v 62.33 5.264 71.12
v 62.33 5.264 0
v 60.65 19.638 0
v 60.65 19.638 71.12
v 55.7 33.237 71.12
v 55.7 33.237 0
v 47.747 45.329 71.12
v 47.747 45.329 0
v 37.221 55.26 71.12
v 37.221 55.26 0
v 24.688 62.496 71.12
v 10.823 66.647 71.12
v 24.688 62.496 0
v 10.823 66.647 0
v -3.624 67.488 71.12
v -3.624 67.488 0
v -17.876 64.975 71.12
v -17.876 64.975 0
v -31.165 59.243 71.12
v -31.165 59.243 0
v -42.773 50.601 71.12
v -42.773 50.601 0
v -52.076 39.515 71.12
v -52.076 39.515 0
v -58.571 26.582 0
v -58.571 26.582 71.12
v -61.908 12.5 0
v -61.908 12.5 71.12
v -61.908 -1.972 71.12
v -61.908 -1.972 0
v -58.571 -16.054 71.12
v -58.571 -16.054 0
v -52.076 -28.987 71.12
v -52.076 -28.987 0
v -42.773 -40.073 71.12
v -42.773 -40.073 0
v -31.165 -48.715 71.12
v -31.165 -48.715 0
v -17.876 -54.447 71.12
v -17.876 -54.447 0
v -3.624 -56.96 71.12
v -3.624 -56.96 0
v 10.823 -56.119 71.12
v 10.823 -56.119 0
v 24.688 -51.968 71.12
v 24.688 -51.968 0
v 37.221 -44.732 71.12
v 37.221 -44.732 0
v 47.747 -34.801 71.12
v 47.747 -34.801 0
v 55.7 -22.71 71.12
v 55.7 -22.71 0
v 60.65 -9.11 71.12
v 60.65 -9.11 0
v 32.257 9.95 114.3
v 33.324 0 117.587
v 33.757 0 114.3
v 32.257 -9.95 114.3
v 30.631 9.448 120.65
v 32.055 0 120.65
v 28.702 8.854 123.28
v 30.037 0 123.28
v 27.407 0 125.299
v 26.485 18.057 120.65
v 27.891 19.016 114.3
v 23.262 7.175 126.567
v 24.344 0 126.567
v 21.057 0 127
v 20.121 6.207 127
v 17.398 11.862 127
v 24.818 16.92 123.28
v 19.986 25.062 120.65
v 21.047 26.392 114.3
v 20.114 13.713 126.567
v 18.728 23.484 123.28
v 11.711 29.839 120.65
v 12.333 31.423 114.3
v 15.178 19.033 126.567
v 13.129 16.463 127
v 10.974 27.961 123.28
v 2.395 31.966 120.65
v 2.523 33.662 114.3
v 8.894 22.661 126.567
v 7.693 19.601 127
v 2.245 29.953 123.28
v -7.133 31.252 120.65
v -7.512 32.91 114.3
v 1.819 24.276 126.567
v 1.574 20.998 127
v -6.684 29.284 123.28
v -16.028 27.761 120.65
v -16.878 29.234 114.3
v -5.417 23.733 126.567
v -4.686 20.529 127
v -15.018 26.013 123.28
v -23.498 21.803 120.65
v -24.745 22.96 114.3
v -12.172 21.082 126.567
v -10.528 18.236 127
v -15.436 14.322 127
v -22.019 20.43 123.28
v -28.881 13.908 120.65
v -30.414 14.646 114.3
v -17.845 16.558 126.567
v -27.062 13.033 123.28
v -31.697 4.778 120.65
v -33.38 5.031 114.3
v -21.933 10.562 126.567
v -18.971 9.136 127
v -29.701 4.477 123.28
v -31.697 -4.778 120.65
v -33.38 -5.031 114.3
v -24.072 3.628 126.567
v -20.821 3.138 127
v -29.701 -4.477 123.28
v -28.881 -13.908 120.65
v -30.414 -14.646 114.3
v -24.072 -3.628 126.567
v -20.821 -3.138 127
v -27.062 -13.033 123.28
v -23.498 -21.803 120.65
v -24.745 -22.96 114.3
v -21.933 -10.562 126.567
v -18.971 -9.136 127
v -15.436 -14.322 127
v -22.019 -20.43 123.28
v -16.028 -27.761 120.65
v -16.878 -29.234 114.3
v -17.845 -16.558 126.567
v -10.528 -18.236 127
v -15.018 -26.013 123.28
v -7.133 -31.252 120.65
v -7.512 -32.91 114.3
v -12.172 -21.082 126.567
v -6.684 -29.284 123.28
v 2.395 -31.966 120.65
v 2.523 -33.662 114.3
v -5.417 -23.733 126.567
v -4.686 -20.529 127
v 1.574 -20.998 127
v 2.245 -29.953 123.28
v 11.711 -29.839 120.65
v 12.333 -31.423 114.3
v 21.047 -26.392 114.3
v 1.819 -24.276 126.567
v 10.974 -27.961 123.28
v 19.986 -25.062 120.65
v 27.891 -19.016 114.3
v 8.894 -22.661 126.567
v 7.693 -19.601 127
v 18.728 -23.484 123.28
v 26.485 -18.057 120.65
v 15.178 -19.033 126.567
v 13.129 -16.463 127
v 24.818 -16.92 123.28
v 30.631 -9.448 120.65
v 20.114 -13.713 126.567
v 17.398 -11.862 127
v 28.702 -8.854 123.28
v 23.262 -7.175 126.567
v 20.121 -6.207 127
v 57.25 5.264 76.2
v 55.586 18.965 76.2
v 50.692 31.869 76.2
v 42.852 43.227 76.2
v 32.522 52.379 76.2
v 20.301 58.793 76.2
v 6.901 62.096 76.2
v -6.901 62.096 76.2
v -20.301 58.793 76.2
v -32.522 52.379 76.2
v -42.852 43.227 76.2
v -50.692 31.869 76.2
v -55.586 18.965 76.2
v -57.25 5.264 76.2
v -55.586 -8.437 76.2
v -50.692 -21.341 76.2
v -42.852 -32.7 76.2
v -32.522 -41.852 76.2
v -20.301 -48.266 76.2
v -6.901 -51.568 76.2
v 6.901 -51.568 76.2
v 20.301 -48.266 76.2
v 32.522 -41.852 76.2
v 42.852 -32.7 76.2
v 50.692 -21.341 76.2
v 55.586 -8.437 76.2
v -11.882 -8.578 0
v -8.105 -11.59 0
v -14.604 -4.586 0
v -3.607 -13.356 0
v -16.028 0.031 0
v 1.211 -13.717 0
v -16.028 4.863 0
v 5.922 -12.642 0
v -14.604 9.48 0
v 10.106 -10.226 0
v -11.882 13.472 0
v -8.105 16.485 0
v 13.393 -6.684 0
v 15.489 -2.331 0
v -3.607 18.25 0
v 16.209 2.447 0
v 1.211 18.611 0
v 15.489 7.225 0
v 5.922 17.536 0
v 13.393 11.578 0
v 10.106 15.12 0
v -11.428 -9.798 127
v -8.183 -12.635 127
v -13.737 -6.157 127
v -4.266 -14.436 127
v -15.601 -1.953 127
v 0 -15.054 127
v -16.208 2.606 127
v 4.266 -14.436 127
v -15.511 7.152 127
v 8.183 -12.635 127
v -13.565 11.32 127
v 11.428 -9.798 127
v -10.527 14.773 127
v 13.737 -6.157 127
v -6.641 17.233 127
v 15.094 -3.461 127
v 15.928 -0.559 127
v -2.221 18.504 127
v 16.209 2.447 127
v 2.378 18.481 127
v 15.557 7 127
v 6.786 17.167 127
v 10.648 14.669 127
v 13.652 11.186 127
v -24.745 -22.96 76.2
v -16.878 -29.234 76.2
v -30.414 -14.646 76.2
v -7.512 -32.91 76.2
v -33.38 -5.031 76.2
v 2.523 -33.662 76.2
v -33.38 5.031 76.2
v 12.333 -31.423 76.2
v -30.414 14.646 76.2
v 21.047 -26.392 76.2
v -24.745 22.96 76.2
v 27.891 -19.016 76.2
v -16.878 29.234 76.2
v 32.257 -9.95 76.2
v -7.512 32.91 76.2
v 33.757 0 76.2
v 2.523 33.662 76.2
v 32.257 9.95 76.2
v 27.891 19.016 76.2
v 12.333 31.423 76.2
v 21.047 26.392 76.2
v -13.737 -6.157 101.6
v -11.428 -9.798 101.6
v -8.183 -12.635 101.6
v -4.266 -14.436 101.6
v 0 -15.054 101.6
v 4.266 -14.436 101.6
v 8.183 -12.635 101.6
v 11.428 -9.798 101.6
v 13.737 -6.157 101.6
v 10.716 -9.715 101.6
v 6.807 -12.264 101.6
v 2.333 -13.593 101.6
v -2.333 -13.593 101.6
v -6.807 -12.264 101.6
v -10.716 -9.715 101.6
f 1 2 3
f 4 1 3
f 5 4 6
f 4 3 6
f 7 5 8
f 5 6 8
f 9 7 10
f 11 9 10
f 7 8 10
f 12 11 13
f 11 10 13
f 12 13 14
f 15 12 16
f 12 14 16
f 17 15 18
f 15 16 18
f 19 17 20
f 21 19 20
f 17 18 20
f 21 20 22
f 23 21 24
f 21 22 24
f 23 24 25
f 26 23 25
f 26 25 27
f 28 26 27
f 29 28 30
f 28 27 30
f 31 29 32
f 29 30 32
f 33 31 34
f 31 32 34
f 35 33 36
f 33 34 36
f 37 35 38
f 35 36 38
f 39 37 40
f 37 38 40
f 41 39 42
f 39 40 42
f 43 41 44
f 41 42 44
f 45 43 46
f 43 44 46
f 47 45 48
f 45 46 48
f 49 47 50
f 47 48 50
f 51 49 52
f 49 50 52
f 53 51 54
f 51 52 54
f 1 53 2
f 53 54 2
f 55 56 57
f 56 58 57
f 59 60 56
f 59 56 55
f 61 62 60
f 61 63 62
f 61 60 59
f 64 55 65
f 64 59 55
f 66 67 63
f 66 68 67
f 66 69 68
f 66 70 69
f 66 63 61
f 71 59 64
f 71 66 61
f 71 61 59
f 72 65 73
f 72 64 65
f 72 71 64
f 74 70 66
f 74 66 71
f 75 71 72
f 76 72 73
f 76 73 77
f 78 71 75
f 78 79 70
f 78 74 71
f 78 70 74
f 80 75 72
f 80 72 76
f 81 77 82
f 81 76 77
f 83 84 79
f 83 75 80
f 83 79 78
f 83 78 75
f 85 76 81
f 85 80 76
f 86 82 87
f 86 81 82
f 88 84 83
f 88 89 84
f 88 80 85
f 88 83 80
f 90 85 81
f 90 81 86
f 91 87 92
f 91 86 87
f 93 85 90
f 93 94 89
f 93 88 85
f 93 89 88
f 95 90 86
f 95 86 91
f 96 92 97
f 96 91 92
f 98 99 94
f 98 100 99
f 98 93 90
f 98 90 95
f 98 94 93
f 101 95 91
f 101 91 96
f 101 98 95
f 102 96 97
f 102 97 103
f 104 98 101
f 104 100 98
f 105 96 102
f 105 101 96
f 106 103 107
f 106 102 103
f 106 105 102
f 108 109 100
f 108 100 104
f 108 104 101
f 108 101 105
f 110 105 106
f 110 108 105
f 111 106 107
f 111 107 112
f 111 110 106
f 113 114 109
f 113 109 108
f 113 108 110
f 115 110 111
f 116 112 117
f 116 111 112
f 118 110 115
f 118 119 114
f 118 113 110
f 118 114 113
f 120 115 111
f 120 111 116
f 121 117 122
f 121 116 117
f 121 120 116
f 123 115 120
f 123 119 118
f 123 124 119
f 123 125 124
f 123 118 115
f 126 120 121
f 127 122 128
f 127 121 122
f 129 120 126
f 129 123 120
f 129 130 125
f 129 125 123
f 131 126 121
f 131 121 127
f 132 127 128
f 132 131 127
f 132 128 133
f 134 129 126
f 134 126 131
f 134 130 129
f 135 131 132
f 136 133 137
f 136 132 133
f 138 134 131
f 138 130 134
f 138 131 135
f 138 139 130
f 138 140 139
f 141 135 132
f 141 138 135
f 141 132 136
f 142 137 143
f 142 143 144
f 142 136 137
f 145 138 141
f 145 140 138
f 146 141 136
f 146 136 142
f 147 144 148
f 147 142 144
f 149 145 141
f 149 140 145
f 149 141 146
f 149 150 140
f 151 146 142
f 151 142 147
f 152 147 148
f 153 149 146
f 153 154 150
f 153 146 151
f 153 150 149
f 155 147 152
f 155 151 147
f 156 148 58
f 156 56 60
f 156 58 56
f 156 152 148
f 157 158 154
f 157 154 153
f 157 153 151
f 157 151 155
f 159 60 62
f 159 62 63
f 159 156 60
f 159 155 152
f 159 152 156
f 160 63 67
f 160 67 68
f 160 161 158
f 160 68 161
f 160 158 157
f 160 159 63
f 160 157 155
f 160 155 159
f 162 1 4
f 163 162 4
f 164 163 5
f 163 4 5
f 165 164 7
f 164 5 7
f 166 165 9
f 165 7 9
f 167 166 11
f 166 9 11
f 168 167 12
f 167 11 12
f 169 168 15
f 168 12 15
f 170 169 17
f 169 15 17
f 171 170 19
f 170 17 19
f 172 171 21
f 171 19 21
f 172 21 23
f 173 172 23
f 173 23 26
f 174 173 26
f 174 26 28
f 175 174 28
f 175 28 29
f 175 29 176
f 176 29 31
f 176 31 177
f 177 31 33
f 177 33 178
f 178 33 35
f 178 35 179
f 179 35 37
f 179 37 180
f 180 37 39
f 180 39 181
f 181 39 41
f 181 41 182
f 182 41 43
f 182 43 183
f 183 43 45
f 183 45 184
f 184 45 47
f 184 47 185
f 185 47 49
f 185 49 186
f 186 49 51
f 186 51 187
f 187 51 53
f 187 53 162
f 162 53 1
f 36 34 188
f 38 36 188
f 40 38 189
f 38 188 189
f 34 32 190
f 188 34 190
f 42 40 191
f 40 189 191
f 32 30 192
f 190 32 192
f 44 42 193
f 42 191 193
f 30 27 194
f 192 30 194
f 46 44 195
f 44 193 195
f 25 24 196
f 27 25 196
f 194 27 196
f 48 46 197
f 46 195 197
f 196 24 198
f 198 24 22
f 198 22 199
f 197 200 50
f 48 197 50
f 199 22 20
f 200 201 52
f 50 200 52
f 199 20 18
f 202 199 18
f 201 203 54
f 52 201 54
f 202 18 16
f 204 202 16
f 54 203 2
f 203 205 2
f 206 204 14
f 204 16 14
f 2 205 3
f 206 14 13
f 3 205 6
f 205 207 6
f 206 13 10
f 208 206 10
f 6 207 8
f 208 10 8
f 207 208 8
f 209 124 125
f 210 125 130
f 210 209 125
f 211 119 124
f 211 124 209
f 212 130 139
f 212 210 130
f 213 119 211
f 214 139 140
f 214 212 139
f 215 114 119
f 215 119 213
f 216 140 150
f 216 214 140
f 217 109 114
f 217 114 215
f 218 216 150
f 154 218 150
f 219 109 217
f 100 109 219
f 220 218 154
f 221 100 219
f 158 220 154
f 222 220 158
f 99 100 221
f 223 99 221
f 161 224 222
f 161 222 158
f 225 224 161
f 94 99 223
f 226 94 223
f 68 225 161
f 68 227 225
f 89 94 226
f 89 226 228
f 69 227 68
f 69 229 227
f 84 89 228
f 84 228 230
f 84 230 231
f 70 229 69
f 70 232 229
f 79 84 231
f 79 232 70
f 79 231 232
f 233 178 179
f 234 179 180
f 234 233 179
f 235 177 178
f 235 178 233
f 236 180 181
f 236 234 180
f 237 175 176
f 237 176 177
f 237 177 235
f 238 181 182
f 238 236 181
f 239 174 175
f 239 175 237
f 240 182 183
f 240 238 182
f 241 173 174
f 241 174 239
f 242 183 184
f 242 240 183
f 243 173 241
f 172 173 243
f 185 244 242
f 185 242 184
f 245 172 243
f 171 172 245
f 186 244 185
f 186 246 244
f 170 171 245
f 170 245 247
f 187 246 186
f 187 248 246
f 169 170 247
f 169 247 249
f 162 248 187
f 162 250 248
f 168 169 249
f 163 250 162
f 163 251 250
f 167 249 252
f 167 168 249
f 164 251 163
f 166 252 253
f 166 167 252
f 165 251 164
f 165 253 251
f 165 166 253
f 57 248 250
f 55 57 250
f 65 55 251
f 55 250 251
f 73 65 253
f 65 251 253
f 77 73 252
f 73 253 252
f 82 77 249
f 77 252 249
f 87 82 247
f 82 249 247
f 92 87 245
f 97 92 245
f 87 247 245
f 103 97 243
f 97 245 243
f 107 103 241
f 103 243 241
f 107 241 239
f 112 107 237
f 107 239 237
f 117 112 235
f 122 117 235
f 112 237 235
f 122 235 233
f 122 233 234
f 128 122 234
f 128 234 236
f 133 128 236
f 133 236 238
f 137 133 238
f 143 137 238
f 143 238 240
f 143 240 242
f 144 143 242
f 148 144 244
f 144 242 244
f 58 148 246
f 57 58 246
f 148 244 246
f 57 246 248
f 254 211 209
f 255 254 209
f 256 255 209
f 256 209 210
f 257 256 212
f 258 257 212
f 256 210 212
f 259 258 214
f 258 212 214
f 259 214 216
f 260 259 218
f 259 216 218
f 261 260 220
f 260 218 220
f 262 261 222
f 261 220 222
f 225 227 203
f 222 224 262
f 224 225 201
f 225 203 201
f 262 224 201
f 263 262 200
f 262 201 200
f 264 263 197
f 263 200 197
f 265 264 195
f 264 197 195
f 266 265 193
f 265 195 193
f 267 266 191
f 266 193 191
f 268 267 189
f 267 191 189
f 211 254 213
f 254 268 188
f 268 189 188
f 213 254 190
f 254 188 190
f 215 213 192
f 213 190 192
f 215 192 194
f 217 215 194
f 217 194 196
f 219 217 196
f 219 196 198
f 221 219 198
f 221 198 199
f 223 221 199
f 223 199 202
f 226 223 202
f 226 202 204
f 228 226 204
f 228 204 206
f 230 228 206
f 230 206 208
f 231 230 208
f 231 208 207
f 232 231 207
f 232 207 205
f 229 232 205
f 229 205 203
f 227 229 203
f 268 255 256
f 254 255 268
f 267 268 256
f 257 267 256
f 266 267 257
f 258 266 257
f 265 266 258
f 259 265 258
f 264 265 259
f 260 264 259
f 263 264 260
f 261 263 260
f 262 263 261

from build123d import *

# Parameters (mm, degrees)
F0_R      = 62.329716
F1_DEPTH  = 76.2
F2_R      = 33.756685
F3_DEPTH  = 50.8
F4_R      = 15.053655
F5_DEPTH  = 25.4
F6_R      = 16.209202
F7_DEPTH  = 25.4
F7_FACE_R = 16.209202
F8_DEPTH  = 254
F9_R      = 12.7
F10_SIZE  = 5.08


with BuildPart() as f1:
    # F0 (on Top) → F1 (new body)
    with BuildSketch(Plane.XY):
        with Locations((0, 5.263878)):
            Circle(F0_R)
    extrude(amount=F1_DEPTH)

    # F2 (on face) → F3 (join)
    with BuildSketch(Plane.XY.offset(76.2)):
        Circle(F2_R)
    extrude(amount=F3_DEPTH)

    # F4 (on face) → F5 (cut)
    with BuildSketch(Plane.XY.offset(127)):
        Circle(F4_R)
    extrude(amount=-F5_DEPTH, mode=Mode.SUBTRACT)

    # F6 (on face) → F7 (cut)
    with BuildSketch(Plane(origin=(0, 0, 0), x_dir=(1, 0, 0), z_dir=(0, 0, -1))):
        with Locations((0, -2.447213)):
            Circle(F6_R)
    extrude(amount=-F7_DEPTH, mode=Mode.SUBTRACT)

    # F7_face (on face) → F8 (cut)
    with BuildSketch(Plane(origin=(0, 2.447213, 25.4), x_dir=(1, 0, 0), z_dir=(0, 0, -1))):
        Circle(F7_FACE_R)
    extrude(amount=-F8_DEPTH, mode=Mode.SUBTRACT)

    # F9
    f9_edges = [f1.edges().sort_by_distance(p)[0] for p in [
        (-33.756685, 0, 127),
    ]]
    fillet(f9_edges, radius=F9_R)

    # F10
    f10_edges = [f1.edges().sort_by_distance(p)[0] for p in [
        (-62.329716, 5.263878, 76.2),
    ]]
    chamfer(f10_edges, length=F10_SIZE)


solid = f1.part
